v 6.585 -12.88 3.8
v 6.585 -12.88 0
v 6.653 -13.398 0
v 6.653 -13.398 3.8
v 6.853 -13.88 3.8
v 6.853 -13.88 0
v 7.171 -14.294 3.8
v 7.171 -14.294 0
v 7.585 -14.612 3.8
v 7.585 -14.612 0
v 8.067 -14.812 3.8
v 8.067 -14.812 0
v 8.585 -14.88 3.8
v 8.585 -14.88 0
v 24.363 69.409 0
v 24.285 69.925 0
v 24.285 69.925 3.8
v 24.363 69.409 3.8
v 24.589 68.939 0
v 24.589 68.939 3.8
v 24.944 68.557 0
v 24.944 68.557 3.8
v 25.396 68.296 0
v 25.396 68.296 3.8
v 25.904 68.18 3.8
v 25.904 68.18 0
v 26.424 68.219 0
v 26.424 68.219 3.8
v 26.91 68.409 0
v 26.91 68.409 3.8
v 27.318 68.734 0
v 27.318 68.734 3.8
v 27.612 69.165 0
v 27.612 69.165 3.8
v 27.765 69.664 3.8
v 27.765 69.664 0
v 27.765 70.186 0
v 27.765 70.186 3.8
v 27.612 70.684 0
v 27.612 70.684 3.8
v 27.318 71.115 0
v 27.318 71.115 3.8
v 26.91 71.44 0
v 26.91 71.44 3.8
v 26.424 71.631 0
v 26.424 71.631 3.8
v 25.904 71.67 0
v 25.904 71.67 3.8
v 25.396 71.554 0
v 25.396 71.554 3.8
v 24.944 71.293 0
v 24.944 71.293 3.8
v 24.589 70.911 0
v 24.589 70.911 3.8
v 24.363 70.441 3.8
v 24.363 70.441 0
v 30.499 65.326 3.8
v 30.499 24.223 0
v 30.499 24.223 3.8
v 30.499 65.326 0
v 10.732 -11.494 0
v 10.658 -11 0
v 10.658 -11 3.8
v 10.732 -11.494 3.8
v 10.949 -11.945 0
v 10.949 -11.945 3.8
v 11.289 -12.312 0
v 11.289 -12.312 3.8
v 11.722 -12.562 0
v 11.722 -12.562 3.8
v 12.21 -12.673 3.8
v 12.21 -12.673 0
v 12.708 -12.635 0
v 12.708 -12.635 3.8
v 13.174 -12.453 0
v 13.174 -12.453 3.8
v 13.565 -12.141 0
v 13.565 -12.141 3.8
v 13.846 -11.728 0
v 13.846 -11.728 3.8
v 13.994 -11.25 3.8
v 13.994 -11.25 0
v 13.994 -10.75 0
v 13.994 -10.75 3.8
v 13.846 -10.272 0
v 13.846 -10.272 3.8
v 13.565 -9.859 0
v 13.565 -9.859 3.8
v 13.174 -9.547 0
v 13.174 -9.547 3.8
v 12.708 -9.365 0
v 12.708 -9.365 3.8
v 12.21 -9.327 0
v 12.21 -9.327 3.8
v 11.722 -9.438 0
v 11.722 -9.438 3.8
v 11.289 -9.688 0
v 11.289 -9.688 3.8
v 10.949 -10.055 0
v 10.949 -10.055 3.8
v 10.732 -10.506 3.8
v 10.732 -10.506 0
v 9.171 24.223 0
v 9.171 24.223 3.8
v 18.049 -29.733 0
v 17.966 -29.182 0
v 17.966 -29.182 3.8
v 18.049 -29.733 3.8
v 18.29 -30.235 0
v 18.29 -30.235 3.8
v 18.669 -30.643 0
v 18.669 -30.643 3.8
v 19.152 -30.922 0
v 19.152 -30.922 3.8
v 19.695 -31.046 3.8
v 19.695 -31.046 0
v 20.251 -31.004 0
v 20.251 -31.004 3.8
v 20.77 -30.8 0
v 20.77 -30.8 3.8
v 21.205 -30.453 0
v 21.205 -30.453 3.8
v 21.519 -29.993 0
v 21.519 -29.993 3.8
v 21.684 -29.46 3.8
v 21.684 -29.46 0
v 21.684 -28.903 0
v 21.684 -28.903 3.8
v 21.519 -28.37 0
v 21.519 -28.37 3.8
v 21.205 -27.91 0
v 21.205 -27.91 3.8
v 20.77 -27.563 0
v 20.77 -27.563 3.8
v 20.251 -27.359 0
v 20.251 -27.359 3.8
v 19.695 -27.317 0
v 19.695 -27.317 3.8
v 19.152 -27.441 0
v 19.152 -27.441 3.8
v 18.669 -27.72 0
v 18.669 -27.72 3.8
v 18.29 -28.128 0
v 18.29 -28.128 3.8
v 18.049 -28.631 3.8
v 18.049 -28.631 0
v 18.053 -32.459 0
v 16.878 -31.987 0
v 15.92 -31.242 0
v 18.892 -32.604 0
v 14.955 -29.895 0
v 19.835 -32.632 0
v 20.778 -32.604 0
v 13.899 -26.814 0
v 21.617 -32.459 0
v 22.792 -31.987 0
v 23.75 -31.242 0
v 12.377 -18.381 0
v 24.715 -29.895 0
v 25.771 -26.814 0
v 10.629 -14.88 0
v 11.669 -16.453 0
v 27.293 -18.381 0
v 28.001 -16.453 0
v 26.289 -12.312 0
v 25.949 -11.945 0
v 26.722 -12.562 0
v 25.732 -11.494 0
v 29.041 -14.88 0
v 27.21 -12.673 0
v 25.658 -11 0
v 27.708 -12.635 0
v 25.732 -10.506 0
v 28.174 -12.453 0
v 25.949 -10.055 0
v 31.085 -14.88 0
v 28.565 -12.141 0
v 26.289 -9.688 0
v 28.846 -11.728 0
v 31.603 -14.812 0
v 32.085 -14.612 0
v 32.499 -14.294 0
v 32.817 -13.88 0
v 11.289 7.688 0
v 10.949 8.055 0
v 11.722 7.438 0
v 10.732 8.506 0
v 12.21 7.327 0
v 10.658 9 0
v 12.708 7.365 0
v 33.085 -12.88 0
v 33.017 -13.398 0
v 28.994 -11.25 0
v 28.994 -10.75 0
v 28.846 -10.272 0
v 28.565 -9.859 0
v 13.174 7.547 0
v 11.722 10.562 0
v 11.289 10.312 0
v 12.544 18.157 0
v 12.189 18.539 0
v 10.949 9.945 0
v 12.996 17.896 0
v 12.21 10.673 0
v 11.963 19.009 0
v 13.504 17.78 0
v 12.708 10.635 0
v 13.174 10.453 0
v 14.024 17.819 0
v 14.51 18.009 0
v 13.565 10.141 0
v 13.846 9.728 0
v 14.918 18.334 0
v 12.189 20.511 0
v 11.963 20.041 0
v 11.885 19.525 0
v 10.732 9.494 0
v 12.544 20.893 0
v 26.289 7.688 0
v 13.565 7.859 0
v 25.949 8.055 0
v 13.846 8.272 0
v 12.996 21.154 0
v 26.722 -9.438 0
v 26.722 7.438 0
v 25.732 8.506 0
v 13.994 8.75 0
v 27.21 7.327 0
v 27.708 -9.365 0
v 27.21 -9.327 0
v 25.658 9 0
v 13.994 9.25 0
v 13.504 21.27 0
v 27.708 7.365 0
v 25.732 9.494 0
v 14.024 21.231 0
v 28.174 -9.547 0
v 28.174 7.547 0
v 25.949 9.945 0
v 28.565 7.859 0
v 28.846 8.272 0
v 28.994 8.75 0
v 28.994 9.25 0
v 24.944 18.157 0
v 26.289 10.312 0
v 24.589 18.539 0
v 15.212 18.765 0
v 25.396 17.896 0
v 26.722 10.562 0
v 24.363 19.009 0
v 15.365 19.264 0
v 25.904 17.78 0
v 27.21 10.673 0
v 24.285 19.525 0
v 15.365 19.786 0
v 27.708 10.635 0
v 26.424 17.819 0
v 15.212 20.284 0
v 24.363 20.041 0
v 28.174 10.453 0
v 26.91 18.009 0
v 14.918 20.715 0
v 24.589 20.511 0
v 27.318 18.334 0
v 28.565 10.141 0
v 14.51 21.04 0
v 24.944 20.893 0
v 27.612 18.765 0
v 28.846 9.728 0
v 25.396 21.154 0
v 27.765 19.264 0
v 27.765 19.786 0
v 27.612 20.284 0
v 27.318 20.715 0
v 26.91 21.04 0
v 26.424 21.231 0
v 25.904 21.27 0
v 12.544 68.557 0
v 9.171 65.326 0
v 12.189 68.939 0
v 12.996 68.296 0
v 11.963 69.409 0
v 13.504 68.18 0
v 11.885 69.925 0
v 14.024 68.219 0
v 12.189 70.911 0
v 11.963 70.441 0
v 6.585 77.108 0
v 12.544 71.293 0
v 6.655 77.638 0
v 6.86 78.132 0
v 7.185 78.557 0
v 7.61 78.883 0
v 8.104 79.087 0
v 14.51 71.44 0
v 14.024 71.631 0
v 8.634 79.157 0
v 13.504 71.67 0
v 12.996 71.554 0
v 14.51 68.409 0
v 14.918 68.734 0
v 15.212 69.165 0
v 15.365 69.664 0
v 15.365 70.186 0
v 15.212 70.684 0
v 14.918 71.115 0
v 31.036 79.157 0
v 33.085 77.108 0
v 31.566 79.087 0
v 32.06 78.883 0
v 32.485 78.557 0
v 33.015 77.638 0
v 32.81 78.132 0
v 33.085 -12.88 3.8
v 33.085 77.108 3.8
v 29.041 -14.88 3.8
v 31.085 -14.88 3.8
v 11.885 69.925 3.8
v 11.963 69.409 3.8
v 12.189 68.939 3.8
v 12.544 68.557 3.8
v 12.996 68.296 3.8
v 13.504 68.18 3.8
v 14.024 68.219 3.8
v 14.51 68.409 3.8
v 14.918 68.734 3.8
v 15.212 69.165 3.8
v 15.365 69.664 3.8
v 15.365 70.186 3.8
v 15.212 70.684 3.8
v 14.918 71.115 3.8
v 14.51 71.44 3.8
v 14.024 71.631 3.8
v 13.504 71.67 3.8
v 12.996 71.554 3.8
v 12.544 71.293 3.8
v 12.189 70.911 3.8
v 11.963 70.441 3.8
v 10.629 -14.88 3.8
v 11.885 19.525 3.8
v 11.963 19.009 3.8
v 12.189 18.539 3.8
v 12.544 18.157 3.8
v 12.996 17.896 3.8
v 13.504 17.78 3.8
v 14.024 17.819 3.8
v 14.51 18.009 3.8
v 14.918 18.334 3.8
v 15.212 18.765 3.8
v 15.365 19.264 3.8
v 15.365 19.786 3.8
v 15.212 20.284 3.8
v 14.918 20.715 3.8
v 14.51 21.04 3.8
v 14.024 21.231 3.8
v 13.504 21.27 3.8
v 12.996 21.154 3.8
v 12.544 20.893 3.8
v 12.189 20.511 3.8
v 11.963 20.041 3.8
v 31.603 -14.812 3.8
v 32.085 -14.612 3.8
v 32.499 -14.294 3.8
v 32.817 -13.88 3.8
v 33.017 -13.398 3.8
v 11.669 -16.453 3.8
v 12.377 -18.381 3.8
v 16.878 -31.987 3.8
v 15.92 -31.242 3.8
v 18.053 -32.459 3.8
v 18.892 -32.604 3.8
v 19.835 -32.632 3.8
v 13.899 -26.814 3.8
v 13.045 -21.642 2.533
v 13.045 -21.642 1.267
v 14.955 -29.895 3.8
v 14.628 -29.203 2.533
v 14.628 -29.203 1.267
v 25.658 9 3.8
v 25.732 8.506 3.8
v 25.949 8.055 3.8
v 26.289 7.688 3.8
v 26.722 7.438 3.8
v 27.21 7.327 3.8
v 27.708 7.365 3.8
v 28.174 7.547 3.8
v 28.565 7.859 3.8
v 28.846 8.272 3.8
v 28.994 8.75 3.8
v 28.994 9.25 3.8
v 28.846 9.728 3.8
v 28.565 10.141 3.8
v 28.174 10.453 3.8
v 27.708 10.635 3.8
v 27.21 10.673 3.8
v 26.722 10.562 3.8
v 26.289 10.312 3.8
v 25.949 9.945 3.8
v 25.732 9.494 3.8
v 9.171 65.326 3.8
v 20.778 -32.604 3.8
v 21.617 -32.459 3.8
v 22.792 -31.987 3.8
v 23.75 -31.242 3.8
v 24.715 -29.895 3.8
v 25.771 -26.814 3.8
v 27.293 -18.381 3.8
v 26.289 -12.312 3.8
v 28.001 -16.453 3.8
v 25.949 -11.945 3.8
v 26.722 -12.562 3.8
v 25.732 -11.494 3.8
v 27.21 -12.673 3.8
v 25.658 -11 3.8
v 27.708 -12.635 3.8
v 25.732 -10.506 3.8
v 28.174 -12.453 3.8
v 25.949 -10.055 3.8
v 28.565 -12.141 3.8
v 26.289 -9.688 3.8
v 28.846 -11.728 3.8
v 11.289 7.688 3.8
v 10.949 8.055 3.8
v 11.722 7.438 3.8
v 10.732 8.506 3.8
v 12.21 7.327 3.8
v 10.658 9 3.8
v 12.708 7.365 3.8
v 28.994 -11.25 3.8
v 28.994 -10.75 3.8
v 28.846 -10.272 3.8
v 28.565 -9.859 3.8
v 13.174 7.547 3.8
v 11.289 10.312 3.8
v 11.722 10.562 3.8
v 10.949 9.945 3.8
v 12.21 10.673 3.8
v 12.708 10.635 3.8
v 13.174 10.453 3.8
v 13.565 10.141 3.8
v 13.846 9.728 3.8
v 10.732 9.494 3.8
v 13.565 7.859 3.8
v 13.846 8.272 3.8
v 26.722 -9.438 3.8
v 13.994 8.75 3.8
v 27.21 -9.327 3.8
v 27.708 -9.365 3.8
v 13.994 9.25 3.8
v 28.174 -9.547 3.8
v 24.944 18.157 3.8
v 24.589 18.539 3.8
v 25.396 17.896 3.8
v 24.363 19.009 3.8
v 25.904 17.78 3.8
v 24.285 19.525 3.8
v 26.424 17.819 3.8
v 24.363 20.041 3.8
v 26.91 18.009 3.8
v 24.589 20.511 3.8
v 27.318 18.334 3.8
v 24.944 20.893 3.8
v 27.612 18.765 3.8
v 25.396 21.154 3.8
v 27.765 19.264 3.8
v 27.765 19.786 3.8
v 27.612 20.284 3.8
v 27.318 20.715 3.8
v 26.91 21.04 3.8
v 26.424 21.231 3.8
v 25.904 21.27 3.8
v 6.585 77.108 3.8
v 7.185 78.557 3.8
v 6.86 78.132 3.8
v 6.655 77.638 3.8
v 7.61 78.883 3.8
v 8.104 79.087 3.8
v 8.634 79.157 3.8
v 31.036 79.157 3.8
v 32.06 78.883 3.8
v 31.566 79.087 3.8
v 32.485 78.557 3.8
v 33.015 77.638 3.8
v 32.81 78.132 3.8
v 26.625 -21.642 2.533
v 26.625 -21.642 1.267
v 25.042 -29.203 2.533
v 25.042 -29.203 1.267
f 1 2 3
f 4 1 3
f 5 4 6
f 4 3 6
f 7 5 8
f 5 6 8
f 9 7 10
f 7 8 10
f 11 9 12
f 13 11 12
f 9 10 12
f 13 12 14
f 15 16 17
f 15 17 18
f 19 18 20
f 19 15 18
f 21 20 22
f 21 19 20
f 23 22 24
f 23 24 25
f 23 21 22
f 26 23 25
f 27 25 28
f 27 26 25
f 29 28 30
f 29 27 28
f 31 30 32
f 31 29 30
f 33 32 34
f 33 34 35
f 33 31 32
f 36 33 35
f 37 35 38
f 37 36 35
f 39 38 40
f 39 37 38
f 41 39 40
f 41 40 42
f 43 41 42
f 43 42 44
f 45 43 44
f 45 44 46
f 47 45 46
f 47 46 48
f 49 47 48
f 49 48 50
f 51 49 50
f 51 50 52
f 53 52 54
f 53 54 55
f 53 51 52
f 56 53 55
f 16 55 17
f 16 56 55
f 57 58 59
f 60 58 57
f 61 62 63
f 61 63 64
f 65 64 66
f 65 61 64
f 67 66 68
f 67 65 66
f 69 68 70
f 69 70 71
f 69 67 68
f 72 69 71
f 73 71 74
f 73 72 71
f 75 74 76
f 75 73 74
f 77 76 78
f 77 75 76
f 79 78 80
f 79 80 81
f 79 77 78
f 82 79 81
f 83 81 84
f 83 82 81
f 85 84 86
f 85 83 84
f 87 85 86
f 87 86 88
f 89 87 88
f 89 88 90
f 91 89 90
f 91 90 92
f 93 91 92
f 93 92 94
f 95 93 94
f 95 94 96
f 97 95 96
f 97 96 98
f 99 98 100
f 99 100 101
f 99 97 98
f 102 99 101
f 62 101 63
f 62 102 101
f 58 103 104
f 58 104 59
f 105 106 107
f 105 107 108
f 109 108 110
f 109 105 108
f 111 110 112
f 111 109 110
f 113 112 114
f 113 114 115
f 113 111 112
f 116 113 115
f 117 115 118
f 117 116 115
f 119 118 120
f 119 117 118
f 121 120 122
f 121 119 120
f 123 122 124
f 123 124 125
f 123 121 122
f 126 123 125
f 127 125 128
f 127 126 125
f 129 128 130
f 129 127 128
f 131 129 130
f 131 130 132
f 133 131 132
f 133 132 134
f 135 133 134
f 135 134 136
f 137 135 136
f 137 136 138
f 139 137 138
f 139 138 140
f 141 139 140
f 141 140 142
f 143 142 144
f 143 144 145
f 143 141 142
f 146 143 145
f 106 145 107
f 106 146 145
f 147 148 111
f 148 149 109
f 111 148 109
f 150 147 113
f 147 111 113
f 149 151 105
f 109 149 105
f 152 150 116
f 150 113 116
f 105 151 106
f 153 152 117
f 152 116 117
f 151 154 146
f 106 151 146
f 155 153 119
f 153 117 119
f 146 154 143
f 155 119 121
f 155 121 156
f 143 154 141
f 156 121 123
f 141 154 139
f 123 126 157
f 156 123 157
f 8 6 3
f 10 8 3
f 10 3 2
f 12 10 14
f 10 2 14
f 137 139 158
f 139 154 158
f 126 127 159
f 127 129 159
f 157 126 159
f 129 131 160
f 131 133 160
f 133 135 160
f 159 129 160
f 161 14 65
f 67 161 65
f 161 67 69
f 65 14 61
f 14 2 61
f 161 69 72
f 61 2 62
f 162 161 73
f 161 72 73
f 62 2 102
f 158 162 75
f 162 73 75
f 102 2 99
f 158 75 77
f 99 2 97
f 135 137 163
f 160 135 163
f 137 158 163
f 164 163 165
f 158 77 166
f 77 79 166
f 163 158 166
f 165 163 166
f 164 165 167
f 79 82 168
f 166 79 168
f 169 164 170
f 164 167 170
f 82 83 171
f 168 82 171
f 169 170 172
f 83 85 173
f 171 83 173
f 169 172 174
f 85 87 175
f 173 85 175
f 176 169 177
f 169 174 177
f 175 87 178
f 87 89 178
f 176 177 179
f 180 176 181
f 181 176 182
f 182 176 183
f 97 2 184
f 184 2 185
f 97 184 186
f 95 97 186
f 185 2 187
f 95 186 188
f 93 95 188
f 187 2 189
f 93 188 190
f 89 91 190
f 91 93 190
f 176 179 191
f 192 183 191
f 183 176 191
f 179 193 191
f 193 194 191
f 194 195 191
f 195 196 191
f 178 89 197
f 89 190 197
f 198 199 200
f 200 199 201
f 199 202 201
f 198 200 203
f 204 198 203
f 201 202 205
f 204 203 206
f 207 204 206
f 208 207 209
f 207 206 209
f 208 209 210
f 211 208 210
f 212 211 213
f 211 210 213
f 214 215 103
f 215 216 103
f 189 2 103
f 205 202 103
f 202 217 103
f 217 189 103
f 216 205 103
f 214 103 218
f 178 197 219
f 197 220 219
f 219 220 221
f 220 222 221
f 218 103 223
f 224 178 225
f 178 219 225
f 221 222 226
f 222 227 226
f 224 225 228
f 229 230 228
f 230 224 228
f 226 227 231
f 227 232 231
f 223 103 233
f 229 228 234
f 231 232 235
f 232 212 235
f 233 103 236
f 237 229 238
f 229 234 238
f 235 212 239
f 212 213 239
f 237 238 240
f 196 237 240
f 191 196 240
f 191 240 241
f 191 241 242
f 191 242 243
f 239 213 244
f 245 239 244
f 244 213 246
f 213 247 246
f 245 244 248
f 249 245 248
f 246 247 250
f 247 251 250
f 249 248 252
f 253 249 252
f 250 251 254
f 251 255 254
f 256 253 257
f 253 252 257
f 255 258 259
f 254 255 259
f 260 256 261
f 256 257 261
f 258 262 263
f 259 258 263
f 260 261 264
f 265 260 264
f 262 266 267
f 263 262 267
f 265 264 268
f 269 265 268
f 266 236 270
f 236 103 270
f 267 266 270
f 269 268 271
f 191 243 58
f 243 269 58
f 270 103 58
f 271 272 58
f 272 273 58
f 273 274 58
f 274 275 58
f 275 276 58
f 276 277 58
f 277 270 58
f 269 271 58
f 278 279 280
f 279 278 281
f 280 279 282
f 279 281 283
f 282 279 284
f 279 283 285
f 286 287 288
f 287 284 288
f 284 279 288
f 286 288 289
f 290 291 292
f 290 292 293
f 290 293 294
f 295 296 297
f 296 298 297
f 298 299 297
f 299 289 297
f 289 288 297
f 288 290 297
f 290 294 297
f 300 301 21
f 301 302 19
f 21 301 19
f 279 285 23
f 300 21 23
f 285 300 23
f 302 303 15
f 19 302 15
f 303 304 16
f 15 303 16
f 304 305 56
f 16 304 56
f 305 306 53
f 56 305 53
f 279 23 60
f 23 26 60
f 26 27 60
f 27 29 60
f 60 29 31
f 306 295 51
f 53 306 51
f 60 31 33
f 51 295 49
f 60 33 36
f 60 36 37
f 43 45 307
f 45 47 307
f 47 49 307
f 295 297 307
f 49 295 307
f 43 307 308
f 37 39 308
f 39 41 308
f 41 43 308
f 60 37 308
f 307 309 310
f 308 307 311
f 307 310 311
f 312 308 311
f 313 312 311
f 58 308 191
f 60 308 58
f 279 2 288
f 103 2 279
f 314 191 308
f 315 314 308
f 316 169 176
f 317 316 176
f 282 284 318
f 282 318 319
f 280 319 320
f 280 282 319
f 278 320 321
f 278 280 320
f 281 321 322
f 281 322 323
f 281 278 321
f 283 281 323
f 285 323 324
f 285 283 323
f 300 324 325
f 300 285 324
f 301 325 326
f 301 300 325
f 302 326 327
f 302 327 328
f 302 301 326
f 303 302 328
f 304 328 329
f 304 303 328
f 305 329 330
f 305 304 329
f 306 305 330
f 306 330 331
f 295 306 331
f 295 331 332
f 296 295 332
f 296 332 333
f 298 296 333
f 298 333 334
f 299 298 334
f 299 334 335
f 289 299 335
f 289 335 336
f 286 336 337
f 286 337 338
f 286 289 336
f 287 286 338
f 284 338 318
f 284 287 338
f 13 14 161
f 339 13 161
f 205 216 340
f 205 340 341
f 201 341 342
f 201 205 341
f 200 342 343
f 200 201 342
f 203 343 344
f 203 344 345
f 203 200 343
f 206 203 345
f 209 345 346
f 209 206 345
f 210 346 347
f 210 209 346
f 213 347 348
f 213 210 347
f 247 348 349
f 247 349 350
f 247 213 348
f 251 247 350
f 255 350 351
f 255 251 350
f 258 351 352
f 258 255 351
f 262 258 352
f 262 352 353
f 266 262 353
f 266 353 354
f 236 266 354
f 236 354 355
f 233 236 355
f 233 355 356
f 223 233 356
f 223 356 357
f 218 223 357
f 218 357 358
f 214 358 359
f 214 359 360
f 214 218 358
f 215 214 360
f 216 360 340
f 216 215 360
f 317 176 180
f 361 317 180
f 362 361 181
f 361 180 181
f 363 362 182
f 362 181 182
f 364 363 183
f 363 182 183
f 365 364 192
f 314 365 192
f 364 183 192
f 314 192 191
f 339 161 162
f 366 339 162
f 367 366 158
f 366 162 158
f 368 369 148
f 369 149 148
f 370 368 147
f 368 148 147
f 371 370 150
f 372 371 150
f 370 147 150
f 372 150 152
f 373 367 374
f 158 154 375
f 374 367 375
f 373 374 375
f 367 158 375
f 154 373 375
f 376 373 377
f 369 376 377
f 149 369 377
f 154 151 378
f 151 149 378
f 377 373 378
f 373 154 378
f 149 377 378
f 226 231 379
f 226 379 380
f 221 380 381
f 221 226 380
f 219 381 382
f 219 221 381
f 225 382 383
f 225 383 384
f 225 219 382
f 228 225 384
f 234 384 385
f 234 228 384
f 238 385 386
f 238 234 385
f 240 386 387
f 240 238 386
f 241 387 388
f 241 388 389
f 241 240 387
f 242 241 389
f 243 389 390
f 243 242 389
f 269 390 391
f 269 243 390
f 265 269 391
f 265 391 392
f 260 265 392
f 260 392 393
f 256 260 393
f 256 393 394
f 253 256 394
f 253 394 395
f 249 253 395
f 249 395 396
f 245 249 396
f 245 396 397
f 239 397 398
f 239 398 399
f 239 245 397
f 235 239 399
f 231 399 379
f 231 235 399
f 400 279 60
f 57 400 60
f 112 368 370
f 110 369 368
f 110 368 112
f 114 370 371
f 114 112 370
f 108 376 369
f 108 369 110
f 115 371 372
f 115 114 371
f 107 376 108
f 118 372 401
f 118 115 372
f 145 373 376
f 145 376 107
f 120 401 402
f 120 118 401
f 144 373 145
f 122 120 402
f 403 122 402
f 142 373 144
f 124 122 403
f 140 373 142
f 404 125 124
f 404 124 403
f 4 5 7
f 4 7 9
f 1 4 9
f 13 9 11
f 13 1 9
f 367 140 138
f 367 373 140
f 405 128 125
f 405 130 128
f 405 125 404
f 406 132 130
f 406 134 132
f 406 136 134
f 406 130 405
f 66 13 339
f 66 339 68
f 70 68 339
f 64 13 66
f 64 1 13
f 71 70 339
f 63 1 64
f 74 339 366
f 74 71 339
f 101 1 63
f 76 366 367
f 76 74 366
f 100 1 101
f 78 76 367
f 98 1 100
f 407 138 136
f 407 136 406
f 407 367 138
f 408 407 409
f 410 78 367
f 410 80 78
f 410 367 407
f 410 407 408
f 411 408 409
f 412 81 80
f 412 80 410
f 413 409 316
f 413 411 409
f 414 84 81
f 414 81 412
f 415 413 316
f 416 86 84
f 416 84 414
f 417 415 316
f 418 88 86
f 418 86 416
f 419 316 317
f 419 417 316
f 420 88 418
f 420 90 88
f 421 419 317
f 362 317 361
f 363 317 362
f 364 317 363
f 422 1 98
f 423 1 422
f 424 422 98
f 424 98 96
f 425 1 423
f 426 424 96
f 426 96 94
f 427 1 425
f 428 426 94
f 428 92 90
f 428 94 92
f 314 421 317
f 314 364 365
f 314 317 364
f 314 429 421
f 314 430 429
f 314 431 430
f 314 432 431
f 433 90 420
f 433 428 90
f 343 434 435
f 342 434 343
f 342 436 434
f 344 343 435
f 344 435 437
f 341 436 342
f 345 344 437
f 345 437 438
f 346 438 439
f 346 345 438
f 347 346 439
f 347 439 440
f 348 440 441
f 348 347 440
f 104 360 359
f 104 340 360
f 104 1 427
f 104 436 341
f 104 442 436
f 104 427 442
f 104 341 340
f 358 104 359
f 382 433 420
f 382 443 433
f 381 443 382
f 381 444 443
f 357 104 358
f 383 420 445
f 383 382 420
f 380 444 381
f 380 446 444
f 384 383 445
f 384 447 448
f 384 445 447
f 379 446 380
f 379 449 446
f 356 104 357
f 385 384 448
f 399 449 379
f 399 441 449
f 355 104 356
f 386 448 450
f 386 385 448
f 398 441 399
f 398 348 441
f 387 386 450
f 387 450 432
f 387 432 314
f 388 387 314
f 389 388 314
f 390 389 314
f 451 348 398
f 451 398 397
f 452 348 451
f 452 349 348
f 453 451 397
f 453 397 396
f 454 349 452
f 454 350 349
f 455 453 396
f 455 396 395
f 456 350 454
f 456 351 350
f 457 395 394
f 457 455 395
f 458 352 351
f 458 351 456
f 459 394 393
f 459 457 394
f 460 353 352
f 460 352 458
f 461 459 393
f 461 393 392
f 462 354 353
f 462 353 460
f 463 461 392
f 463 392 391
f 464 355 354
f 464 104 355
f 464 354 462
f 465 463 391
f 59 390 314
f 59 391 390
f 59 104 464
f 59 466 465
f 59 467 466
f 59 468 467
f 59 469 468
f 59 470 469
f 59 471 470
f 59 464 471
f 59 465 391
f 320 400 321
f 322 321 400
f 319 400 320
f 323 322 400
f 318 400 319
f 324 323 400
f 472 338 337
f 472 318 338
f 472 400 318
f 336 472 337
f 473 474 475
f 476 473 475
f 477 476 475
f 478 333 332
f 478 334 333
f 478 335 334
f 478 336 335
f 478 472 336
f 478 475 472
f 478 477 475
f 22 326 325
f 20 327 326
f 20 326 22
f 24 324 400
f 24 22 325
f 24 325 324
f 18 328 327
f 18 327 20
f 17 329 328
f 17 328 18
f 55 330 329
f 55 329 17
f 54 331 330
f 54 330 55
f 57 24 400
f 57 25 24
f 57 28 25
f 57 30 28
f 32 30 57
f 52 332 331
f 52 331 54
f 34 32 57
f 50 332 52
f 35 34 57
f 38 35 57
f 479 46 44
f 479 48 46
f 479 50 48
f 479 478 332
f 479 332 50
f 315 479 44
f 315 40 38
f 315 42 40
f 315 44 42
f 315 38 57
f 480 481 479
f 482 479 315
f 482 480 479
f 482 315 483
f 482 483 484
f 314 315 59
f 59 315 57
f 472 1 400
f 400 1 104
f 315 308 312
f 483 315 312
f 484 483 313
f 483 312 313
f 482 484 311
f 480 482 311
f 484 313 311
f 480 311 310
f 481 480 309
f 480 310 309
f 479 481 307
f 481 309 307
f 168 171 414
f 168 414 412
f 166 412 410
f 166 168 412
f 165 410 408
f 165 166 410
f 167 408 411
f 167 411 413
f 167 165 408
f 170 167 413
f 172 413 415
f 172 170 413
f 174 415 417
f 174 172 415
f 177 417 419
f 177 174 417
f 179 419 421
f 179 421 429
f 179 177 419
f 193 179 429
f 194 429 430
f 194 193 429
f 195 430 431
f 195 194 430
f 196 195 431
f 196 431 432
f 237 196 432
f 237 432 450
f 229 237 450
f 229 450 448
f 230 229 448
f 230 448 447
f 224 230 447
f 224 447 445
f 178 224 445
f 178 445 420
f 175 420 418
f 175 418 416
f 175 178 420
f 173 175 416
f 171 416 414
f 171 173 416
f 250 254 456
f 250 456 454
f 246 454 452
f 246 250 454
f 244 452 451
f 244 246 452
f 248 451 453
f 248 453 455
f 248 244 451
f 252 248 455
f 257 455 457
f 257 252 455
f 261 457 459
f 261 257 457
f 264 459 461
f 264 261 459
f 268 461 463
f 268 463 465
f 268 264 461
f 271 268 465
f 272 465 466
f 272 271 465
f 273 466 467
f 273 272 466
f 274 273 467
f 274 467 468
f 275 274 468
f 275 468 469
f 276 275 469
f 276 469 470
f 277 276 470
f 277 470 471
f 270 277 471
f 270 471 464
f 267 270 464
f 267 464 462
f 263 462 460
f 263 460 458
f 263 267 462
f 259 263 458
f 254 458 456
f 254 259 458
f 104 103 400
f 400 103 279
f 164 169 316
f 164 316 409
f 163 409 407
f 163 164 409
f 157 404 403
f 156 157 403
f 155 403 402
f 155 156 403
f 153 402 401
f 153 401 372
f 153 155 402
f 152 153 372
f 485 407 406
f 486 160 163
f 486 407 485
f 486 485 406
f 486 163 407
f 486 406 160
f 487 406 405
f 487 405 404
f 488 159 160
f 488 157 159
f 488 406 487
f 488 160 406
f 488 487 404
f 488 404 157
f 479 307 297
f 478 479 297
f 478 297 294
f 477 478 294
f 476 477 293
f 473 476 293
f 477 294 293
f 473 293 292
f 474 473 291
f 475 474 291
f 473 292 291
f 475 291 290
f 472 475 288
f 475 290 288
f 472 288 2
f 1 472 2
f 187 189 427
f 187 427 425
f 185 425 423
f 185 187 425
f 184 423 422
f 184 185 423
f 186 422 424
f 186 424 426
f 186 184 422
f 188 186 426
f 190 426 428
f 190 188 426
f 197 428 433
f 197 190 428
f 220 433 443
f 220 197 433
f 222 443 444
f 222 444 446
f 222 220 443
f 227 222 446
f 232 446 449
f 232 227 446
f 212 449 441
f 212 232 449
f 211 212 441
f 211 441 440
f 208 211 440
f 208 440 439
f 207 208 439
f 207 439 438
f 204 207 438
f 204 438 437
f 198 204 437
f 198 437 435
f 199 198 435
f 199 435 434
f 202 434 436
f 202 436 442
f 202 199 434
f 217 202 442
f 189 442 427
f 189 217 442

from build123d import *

# Parameters (mm, degrees)
SKETCH1_R           = 1.869394483
SKETCH1_R_2         = 1.6775
SKETCH1_R_3         = 1.75
SKETCH1_W           = 21.327694626
SKETCH1_H           = 41.102200046
BOSS_EXTRUDE1_DEPTH = 3.8


with BuildPart() as part:
    # Sketch1 → Boss-Extrude1 (new body)
    with BuildSketch(Plane.XY):
        with BuildLine():
            Line((8.585, -14.879916086), (10.629231235, -14.879916086))
            add(Edge.make_bspline(
                [(10.629231235, -14.879916086), (14.945689429, -19.598266914), (11.330822281, -32.912320887), (19.835, -32.631980139)],
                knots=[0, 0, 0, 0, 1, 1, 1, 1], degree=3))
            add(Edge.make_bspline(
                [(29.040768765, -14.879916086), (24.724310571, -19.598266914), (28.339177719, -32.912320887), (19.835, -32.631980139)],
                knots=[0, 0, 0, 0, 1, 1, 1, 1], degree=3))
            Line((29.040768765, -14.879916086), (31.085, -14.879916086))
            ThreePointArc((31.085, -14.879916086), (32.499213562, -14.294129648), (33.085, -12.879916086))
            Line((33.085, -12.879916086), (33.085, 77.107681283))
            ThreePointArc((33.085, 77.107681283), (32.484733836, 78.556851998), (31.035563121, 79.157118162))
            Line((31.035563121, 79.157118162), (8.634436879, 79.157118162))
            ThreePointArc((8.634436879, 79.157118162), (7.185266164, 78.556851998), (6.585, 77.107681283))
            Line((6.585, 77.107681283), (6.585, -12.879916086))
            ThreePointArc((6.585, -12.879916086), (7.170786438, -14.294129648), (8.585, -14.879916086))
        make_face()
        with Locations(Location((19.835, -29.181539917, 0), (0, 0, 180))):
            Circle(SKETCH1_R, mode=Mode.SUBTRACT)
        with Locations(Location((12.335, 9, 0), (0, 0, 180))):
            Circle(SKETCH1_R_2, mode=Mode.SUBTRACT)
        with Locations(Location((12.335, -11, 0), (0, 0, 180))):
            Circle(SKETCH1_R_2, mode=Mode.SUBTRACT)
        with Locations(Location((27.335, 9, 0), (0, 0, 180))):
            Circle(SKETCH1_R_2, mode=Mode.SUBTRACT)
        with Locations(Location((27.335, -11, 0), (0, 0, 180))):
            Circle(SKETCH1_R_2, mode=Mode.SUBTRACT)
        with Locations(Location((26.035, 69.924718691, 0), (0, 0, 180))):
            Circle(SKETCH1_R_3, mode=Mode.SUBTRACT)
        with Locations(Location((13.635, 69.924718691, 0), (0, 0, 180))):
            Circle(SKETCH1_R_3, mode=Mode.SUBTRACT)
        with Locations(Location((13.635, 19.524718691, 0), (0, 0, 180))):
            Circle(SKETCH1_R_3, mode=Mode.SUBTRACT)
        with Locations(Location((26.035, 19.524718691, 0), (0, 0, 180))):
            Circle(SKETCH1_R_3, mode=Mode.SUBTRACT)
        with Locations((19.835, 44.774489529)):
            Rectangle(SKETCH1_W, SKETCH1_H, mode=Mode.SUBTRACT)
    extrude(amount=BOSS_EXTRUDE1_DEPTH)


solid = part.part
